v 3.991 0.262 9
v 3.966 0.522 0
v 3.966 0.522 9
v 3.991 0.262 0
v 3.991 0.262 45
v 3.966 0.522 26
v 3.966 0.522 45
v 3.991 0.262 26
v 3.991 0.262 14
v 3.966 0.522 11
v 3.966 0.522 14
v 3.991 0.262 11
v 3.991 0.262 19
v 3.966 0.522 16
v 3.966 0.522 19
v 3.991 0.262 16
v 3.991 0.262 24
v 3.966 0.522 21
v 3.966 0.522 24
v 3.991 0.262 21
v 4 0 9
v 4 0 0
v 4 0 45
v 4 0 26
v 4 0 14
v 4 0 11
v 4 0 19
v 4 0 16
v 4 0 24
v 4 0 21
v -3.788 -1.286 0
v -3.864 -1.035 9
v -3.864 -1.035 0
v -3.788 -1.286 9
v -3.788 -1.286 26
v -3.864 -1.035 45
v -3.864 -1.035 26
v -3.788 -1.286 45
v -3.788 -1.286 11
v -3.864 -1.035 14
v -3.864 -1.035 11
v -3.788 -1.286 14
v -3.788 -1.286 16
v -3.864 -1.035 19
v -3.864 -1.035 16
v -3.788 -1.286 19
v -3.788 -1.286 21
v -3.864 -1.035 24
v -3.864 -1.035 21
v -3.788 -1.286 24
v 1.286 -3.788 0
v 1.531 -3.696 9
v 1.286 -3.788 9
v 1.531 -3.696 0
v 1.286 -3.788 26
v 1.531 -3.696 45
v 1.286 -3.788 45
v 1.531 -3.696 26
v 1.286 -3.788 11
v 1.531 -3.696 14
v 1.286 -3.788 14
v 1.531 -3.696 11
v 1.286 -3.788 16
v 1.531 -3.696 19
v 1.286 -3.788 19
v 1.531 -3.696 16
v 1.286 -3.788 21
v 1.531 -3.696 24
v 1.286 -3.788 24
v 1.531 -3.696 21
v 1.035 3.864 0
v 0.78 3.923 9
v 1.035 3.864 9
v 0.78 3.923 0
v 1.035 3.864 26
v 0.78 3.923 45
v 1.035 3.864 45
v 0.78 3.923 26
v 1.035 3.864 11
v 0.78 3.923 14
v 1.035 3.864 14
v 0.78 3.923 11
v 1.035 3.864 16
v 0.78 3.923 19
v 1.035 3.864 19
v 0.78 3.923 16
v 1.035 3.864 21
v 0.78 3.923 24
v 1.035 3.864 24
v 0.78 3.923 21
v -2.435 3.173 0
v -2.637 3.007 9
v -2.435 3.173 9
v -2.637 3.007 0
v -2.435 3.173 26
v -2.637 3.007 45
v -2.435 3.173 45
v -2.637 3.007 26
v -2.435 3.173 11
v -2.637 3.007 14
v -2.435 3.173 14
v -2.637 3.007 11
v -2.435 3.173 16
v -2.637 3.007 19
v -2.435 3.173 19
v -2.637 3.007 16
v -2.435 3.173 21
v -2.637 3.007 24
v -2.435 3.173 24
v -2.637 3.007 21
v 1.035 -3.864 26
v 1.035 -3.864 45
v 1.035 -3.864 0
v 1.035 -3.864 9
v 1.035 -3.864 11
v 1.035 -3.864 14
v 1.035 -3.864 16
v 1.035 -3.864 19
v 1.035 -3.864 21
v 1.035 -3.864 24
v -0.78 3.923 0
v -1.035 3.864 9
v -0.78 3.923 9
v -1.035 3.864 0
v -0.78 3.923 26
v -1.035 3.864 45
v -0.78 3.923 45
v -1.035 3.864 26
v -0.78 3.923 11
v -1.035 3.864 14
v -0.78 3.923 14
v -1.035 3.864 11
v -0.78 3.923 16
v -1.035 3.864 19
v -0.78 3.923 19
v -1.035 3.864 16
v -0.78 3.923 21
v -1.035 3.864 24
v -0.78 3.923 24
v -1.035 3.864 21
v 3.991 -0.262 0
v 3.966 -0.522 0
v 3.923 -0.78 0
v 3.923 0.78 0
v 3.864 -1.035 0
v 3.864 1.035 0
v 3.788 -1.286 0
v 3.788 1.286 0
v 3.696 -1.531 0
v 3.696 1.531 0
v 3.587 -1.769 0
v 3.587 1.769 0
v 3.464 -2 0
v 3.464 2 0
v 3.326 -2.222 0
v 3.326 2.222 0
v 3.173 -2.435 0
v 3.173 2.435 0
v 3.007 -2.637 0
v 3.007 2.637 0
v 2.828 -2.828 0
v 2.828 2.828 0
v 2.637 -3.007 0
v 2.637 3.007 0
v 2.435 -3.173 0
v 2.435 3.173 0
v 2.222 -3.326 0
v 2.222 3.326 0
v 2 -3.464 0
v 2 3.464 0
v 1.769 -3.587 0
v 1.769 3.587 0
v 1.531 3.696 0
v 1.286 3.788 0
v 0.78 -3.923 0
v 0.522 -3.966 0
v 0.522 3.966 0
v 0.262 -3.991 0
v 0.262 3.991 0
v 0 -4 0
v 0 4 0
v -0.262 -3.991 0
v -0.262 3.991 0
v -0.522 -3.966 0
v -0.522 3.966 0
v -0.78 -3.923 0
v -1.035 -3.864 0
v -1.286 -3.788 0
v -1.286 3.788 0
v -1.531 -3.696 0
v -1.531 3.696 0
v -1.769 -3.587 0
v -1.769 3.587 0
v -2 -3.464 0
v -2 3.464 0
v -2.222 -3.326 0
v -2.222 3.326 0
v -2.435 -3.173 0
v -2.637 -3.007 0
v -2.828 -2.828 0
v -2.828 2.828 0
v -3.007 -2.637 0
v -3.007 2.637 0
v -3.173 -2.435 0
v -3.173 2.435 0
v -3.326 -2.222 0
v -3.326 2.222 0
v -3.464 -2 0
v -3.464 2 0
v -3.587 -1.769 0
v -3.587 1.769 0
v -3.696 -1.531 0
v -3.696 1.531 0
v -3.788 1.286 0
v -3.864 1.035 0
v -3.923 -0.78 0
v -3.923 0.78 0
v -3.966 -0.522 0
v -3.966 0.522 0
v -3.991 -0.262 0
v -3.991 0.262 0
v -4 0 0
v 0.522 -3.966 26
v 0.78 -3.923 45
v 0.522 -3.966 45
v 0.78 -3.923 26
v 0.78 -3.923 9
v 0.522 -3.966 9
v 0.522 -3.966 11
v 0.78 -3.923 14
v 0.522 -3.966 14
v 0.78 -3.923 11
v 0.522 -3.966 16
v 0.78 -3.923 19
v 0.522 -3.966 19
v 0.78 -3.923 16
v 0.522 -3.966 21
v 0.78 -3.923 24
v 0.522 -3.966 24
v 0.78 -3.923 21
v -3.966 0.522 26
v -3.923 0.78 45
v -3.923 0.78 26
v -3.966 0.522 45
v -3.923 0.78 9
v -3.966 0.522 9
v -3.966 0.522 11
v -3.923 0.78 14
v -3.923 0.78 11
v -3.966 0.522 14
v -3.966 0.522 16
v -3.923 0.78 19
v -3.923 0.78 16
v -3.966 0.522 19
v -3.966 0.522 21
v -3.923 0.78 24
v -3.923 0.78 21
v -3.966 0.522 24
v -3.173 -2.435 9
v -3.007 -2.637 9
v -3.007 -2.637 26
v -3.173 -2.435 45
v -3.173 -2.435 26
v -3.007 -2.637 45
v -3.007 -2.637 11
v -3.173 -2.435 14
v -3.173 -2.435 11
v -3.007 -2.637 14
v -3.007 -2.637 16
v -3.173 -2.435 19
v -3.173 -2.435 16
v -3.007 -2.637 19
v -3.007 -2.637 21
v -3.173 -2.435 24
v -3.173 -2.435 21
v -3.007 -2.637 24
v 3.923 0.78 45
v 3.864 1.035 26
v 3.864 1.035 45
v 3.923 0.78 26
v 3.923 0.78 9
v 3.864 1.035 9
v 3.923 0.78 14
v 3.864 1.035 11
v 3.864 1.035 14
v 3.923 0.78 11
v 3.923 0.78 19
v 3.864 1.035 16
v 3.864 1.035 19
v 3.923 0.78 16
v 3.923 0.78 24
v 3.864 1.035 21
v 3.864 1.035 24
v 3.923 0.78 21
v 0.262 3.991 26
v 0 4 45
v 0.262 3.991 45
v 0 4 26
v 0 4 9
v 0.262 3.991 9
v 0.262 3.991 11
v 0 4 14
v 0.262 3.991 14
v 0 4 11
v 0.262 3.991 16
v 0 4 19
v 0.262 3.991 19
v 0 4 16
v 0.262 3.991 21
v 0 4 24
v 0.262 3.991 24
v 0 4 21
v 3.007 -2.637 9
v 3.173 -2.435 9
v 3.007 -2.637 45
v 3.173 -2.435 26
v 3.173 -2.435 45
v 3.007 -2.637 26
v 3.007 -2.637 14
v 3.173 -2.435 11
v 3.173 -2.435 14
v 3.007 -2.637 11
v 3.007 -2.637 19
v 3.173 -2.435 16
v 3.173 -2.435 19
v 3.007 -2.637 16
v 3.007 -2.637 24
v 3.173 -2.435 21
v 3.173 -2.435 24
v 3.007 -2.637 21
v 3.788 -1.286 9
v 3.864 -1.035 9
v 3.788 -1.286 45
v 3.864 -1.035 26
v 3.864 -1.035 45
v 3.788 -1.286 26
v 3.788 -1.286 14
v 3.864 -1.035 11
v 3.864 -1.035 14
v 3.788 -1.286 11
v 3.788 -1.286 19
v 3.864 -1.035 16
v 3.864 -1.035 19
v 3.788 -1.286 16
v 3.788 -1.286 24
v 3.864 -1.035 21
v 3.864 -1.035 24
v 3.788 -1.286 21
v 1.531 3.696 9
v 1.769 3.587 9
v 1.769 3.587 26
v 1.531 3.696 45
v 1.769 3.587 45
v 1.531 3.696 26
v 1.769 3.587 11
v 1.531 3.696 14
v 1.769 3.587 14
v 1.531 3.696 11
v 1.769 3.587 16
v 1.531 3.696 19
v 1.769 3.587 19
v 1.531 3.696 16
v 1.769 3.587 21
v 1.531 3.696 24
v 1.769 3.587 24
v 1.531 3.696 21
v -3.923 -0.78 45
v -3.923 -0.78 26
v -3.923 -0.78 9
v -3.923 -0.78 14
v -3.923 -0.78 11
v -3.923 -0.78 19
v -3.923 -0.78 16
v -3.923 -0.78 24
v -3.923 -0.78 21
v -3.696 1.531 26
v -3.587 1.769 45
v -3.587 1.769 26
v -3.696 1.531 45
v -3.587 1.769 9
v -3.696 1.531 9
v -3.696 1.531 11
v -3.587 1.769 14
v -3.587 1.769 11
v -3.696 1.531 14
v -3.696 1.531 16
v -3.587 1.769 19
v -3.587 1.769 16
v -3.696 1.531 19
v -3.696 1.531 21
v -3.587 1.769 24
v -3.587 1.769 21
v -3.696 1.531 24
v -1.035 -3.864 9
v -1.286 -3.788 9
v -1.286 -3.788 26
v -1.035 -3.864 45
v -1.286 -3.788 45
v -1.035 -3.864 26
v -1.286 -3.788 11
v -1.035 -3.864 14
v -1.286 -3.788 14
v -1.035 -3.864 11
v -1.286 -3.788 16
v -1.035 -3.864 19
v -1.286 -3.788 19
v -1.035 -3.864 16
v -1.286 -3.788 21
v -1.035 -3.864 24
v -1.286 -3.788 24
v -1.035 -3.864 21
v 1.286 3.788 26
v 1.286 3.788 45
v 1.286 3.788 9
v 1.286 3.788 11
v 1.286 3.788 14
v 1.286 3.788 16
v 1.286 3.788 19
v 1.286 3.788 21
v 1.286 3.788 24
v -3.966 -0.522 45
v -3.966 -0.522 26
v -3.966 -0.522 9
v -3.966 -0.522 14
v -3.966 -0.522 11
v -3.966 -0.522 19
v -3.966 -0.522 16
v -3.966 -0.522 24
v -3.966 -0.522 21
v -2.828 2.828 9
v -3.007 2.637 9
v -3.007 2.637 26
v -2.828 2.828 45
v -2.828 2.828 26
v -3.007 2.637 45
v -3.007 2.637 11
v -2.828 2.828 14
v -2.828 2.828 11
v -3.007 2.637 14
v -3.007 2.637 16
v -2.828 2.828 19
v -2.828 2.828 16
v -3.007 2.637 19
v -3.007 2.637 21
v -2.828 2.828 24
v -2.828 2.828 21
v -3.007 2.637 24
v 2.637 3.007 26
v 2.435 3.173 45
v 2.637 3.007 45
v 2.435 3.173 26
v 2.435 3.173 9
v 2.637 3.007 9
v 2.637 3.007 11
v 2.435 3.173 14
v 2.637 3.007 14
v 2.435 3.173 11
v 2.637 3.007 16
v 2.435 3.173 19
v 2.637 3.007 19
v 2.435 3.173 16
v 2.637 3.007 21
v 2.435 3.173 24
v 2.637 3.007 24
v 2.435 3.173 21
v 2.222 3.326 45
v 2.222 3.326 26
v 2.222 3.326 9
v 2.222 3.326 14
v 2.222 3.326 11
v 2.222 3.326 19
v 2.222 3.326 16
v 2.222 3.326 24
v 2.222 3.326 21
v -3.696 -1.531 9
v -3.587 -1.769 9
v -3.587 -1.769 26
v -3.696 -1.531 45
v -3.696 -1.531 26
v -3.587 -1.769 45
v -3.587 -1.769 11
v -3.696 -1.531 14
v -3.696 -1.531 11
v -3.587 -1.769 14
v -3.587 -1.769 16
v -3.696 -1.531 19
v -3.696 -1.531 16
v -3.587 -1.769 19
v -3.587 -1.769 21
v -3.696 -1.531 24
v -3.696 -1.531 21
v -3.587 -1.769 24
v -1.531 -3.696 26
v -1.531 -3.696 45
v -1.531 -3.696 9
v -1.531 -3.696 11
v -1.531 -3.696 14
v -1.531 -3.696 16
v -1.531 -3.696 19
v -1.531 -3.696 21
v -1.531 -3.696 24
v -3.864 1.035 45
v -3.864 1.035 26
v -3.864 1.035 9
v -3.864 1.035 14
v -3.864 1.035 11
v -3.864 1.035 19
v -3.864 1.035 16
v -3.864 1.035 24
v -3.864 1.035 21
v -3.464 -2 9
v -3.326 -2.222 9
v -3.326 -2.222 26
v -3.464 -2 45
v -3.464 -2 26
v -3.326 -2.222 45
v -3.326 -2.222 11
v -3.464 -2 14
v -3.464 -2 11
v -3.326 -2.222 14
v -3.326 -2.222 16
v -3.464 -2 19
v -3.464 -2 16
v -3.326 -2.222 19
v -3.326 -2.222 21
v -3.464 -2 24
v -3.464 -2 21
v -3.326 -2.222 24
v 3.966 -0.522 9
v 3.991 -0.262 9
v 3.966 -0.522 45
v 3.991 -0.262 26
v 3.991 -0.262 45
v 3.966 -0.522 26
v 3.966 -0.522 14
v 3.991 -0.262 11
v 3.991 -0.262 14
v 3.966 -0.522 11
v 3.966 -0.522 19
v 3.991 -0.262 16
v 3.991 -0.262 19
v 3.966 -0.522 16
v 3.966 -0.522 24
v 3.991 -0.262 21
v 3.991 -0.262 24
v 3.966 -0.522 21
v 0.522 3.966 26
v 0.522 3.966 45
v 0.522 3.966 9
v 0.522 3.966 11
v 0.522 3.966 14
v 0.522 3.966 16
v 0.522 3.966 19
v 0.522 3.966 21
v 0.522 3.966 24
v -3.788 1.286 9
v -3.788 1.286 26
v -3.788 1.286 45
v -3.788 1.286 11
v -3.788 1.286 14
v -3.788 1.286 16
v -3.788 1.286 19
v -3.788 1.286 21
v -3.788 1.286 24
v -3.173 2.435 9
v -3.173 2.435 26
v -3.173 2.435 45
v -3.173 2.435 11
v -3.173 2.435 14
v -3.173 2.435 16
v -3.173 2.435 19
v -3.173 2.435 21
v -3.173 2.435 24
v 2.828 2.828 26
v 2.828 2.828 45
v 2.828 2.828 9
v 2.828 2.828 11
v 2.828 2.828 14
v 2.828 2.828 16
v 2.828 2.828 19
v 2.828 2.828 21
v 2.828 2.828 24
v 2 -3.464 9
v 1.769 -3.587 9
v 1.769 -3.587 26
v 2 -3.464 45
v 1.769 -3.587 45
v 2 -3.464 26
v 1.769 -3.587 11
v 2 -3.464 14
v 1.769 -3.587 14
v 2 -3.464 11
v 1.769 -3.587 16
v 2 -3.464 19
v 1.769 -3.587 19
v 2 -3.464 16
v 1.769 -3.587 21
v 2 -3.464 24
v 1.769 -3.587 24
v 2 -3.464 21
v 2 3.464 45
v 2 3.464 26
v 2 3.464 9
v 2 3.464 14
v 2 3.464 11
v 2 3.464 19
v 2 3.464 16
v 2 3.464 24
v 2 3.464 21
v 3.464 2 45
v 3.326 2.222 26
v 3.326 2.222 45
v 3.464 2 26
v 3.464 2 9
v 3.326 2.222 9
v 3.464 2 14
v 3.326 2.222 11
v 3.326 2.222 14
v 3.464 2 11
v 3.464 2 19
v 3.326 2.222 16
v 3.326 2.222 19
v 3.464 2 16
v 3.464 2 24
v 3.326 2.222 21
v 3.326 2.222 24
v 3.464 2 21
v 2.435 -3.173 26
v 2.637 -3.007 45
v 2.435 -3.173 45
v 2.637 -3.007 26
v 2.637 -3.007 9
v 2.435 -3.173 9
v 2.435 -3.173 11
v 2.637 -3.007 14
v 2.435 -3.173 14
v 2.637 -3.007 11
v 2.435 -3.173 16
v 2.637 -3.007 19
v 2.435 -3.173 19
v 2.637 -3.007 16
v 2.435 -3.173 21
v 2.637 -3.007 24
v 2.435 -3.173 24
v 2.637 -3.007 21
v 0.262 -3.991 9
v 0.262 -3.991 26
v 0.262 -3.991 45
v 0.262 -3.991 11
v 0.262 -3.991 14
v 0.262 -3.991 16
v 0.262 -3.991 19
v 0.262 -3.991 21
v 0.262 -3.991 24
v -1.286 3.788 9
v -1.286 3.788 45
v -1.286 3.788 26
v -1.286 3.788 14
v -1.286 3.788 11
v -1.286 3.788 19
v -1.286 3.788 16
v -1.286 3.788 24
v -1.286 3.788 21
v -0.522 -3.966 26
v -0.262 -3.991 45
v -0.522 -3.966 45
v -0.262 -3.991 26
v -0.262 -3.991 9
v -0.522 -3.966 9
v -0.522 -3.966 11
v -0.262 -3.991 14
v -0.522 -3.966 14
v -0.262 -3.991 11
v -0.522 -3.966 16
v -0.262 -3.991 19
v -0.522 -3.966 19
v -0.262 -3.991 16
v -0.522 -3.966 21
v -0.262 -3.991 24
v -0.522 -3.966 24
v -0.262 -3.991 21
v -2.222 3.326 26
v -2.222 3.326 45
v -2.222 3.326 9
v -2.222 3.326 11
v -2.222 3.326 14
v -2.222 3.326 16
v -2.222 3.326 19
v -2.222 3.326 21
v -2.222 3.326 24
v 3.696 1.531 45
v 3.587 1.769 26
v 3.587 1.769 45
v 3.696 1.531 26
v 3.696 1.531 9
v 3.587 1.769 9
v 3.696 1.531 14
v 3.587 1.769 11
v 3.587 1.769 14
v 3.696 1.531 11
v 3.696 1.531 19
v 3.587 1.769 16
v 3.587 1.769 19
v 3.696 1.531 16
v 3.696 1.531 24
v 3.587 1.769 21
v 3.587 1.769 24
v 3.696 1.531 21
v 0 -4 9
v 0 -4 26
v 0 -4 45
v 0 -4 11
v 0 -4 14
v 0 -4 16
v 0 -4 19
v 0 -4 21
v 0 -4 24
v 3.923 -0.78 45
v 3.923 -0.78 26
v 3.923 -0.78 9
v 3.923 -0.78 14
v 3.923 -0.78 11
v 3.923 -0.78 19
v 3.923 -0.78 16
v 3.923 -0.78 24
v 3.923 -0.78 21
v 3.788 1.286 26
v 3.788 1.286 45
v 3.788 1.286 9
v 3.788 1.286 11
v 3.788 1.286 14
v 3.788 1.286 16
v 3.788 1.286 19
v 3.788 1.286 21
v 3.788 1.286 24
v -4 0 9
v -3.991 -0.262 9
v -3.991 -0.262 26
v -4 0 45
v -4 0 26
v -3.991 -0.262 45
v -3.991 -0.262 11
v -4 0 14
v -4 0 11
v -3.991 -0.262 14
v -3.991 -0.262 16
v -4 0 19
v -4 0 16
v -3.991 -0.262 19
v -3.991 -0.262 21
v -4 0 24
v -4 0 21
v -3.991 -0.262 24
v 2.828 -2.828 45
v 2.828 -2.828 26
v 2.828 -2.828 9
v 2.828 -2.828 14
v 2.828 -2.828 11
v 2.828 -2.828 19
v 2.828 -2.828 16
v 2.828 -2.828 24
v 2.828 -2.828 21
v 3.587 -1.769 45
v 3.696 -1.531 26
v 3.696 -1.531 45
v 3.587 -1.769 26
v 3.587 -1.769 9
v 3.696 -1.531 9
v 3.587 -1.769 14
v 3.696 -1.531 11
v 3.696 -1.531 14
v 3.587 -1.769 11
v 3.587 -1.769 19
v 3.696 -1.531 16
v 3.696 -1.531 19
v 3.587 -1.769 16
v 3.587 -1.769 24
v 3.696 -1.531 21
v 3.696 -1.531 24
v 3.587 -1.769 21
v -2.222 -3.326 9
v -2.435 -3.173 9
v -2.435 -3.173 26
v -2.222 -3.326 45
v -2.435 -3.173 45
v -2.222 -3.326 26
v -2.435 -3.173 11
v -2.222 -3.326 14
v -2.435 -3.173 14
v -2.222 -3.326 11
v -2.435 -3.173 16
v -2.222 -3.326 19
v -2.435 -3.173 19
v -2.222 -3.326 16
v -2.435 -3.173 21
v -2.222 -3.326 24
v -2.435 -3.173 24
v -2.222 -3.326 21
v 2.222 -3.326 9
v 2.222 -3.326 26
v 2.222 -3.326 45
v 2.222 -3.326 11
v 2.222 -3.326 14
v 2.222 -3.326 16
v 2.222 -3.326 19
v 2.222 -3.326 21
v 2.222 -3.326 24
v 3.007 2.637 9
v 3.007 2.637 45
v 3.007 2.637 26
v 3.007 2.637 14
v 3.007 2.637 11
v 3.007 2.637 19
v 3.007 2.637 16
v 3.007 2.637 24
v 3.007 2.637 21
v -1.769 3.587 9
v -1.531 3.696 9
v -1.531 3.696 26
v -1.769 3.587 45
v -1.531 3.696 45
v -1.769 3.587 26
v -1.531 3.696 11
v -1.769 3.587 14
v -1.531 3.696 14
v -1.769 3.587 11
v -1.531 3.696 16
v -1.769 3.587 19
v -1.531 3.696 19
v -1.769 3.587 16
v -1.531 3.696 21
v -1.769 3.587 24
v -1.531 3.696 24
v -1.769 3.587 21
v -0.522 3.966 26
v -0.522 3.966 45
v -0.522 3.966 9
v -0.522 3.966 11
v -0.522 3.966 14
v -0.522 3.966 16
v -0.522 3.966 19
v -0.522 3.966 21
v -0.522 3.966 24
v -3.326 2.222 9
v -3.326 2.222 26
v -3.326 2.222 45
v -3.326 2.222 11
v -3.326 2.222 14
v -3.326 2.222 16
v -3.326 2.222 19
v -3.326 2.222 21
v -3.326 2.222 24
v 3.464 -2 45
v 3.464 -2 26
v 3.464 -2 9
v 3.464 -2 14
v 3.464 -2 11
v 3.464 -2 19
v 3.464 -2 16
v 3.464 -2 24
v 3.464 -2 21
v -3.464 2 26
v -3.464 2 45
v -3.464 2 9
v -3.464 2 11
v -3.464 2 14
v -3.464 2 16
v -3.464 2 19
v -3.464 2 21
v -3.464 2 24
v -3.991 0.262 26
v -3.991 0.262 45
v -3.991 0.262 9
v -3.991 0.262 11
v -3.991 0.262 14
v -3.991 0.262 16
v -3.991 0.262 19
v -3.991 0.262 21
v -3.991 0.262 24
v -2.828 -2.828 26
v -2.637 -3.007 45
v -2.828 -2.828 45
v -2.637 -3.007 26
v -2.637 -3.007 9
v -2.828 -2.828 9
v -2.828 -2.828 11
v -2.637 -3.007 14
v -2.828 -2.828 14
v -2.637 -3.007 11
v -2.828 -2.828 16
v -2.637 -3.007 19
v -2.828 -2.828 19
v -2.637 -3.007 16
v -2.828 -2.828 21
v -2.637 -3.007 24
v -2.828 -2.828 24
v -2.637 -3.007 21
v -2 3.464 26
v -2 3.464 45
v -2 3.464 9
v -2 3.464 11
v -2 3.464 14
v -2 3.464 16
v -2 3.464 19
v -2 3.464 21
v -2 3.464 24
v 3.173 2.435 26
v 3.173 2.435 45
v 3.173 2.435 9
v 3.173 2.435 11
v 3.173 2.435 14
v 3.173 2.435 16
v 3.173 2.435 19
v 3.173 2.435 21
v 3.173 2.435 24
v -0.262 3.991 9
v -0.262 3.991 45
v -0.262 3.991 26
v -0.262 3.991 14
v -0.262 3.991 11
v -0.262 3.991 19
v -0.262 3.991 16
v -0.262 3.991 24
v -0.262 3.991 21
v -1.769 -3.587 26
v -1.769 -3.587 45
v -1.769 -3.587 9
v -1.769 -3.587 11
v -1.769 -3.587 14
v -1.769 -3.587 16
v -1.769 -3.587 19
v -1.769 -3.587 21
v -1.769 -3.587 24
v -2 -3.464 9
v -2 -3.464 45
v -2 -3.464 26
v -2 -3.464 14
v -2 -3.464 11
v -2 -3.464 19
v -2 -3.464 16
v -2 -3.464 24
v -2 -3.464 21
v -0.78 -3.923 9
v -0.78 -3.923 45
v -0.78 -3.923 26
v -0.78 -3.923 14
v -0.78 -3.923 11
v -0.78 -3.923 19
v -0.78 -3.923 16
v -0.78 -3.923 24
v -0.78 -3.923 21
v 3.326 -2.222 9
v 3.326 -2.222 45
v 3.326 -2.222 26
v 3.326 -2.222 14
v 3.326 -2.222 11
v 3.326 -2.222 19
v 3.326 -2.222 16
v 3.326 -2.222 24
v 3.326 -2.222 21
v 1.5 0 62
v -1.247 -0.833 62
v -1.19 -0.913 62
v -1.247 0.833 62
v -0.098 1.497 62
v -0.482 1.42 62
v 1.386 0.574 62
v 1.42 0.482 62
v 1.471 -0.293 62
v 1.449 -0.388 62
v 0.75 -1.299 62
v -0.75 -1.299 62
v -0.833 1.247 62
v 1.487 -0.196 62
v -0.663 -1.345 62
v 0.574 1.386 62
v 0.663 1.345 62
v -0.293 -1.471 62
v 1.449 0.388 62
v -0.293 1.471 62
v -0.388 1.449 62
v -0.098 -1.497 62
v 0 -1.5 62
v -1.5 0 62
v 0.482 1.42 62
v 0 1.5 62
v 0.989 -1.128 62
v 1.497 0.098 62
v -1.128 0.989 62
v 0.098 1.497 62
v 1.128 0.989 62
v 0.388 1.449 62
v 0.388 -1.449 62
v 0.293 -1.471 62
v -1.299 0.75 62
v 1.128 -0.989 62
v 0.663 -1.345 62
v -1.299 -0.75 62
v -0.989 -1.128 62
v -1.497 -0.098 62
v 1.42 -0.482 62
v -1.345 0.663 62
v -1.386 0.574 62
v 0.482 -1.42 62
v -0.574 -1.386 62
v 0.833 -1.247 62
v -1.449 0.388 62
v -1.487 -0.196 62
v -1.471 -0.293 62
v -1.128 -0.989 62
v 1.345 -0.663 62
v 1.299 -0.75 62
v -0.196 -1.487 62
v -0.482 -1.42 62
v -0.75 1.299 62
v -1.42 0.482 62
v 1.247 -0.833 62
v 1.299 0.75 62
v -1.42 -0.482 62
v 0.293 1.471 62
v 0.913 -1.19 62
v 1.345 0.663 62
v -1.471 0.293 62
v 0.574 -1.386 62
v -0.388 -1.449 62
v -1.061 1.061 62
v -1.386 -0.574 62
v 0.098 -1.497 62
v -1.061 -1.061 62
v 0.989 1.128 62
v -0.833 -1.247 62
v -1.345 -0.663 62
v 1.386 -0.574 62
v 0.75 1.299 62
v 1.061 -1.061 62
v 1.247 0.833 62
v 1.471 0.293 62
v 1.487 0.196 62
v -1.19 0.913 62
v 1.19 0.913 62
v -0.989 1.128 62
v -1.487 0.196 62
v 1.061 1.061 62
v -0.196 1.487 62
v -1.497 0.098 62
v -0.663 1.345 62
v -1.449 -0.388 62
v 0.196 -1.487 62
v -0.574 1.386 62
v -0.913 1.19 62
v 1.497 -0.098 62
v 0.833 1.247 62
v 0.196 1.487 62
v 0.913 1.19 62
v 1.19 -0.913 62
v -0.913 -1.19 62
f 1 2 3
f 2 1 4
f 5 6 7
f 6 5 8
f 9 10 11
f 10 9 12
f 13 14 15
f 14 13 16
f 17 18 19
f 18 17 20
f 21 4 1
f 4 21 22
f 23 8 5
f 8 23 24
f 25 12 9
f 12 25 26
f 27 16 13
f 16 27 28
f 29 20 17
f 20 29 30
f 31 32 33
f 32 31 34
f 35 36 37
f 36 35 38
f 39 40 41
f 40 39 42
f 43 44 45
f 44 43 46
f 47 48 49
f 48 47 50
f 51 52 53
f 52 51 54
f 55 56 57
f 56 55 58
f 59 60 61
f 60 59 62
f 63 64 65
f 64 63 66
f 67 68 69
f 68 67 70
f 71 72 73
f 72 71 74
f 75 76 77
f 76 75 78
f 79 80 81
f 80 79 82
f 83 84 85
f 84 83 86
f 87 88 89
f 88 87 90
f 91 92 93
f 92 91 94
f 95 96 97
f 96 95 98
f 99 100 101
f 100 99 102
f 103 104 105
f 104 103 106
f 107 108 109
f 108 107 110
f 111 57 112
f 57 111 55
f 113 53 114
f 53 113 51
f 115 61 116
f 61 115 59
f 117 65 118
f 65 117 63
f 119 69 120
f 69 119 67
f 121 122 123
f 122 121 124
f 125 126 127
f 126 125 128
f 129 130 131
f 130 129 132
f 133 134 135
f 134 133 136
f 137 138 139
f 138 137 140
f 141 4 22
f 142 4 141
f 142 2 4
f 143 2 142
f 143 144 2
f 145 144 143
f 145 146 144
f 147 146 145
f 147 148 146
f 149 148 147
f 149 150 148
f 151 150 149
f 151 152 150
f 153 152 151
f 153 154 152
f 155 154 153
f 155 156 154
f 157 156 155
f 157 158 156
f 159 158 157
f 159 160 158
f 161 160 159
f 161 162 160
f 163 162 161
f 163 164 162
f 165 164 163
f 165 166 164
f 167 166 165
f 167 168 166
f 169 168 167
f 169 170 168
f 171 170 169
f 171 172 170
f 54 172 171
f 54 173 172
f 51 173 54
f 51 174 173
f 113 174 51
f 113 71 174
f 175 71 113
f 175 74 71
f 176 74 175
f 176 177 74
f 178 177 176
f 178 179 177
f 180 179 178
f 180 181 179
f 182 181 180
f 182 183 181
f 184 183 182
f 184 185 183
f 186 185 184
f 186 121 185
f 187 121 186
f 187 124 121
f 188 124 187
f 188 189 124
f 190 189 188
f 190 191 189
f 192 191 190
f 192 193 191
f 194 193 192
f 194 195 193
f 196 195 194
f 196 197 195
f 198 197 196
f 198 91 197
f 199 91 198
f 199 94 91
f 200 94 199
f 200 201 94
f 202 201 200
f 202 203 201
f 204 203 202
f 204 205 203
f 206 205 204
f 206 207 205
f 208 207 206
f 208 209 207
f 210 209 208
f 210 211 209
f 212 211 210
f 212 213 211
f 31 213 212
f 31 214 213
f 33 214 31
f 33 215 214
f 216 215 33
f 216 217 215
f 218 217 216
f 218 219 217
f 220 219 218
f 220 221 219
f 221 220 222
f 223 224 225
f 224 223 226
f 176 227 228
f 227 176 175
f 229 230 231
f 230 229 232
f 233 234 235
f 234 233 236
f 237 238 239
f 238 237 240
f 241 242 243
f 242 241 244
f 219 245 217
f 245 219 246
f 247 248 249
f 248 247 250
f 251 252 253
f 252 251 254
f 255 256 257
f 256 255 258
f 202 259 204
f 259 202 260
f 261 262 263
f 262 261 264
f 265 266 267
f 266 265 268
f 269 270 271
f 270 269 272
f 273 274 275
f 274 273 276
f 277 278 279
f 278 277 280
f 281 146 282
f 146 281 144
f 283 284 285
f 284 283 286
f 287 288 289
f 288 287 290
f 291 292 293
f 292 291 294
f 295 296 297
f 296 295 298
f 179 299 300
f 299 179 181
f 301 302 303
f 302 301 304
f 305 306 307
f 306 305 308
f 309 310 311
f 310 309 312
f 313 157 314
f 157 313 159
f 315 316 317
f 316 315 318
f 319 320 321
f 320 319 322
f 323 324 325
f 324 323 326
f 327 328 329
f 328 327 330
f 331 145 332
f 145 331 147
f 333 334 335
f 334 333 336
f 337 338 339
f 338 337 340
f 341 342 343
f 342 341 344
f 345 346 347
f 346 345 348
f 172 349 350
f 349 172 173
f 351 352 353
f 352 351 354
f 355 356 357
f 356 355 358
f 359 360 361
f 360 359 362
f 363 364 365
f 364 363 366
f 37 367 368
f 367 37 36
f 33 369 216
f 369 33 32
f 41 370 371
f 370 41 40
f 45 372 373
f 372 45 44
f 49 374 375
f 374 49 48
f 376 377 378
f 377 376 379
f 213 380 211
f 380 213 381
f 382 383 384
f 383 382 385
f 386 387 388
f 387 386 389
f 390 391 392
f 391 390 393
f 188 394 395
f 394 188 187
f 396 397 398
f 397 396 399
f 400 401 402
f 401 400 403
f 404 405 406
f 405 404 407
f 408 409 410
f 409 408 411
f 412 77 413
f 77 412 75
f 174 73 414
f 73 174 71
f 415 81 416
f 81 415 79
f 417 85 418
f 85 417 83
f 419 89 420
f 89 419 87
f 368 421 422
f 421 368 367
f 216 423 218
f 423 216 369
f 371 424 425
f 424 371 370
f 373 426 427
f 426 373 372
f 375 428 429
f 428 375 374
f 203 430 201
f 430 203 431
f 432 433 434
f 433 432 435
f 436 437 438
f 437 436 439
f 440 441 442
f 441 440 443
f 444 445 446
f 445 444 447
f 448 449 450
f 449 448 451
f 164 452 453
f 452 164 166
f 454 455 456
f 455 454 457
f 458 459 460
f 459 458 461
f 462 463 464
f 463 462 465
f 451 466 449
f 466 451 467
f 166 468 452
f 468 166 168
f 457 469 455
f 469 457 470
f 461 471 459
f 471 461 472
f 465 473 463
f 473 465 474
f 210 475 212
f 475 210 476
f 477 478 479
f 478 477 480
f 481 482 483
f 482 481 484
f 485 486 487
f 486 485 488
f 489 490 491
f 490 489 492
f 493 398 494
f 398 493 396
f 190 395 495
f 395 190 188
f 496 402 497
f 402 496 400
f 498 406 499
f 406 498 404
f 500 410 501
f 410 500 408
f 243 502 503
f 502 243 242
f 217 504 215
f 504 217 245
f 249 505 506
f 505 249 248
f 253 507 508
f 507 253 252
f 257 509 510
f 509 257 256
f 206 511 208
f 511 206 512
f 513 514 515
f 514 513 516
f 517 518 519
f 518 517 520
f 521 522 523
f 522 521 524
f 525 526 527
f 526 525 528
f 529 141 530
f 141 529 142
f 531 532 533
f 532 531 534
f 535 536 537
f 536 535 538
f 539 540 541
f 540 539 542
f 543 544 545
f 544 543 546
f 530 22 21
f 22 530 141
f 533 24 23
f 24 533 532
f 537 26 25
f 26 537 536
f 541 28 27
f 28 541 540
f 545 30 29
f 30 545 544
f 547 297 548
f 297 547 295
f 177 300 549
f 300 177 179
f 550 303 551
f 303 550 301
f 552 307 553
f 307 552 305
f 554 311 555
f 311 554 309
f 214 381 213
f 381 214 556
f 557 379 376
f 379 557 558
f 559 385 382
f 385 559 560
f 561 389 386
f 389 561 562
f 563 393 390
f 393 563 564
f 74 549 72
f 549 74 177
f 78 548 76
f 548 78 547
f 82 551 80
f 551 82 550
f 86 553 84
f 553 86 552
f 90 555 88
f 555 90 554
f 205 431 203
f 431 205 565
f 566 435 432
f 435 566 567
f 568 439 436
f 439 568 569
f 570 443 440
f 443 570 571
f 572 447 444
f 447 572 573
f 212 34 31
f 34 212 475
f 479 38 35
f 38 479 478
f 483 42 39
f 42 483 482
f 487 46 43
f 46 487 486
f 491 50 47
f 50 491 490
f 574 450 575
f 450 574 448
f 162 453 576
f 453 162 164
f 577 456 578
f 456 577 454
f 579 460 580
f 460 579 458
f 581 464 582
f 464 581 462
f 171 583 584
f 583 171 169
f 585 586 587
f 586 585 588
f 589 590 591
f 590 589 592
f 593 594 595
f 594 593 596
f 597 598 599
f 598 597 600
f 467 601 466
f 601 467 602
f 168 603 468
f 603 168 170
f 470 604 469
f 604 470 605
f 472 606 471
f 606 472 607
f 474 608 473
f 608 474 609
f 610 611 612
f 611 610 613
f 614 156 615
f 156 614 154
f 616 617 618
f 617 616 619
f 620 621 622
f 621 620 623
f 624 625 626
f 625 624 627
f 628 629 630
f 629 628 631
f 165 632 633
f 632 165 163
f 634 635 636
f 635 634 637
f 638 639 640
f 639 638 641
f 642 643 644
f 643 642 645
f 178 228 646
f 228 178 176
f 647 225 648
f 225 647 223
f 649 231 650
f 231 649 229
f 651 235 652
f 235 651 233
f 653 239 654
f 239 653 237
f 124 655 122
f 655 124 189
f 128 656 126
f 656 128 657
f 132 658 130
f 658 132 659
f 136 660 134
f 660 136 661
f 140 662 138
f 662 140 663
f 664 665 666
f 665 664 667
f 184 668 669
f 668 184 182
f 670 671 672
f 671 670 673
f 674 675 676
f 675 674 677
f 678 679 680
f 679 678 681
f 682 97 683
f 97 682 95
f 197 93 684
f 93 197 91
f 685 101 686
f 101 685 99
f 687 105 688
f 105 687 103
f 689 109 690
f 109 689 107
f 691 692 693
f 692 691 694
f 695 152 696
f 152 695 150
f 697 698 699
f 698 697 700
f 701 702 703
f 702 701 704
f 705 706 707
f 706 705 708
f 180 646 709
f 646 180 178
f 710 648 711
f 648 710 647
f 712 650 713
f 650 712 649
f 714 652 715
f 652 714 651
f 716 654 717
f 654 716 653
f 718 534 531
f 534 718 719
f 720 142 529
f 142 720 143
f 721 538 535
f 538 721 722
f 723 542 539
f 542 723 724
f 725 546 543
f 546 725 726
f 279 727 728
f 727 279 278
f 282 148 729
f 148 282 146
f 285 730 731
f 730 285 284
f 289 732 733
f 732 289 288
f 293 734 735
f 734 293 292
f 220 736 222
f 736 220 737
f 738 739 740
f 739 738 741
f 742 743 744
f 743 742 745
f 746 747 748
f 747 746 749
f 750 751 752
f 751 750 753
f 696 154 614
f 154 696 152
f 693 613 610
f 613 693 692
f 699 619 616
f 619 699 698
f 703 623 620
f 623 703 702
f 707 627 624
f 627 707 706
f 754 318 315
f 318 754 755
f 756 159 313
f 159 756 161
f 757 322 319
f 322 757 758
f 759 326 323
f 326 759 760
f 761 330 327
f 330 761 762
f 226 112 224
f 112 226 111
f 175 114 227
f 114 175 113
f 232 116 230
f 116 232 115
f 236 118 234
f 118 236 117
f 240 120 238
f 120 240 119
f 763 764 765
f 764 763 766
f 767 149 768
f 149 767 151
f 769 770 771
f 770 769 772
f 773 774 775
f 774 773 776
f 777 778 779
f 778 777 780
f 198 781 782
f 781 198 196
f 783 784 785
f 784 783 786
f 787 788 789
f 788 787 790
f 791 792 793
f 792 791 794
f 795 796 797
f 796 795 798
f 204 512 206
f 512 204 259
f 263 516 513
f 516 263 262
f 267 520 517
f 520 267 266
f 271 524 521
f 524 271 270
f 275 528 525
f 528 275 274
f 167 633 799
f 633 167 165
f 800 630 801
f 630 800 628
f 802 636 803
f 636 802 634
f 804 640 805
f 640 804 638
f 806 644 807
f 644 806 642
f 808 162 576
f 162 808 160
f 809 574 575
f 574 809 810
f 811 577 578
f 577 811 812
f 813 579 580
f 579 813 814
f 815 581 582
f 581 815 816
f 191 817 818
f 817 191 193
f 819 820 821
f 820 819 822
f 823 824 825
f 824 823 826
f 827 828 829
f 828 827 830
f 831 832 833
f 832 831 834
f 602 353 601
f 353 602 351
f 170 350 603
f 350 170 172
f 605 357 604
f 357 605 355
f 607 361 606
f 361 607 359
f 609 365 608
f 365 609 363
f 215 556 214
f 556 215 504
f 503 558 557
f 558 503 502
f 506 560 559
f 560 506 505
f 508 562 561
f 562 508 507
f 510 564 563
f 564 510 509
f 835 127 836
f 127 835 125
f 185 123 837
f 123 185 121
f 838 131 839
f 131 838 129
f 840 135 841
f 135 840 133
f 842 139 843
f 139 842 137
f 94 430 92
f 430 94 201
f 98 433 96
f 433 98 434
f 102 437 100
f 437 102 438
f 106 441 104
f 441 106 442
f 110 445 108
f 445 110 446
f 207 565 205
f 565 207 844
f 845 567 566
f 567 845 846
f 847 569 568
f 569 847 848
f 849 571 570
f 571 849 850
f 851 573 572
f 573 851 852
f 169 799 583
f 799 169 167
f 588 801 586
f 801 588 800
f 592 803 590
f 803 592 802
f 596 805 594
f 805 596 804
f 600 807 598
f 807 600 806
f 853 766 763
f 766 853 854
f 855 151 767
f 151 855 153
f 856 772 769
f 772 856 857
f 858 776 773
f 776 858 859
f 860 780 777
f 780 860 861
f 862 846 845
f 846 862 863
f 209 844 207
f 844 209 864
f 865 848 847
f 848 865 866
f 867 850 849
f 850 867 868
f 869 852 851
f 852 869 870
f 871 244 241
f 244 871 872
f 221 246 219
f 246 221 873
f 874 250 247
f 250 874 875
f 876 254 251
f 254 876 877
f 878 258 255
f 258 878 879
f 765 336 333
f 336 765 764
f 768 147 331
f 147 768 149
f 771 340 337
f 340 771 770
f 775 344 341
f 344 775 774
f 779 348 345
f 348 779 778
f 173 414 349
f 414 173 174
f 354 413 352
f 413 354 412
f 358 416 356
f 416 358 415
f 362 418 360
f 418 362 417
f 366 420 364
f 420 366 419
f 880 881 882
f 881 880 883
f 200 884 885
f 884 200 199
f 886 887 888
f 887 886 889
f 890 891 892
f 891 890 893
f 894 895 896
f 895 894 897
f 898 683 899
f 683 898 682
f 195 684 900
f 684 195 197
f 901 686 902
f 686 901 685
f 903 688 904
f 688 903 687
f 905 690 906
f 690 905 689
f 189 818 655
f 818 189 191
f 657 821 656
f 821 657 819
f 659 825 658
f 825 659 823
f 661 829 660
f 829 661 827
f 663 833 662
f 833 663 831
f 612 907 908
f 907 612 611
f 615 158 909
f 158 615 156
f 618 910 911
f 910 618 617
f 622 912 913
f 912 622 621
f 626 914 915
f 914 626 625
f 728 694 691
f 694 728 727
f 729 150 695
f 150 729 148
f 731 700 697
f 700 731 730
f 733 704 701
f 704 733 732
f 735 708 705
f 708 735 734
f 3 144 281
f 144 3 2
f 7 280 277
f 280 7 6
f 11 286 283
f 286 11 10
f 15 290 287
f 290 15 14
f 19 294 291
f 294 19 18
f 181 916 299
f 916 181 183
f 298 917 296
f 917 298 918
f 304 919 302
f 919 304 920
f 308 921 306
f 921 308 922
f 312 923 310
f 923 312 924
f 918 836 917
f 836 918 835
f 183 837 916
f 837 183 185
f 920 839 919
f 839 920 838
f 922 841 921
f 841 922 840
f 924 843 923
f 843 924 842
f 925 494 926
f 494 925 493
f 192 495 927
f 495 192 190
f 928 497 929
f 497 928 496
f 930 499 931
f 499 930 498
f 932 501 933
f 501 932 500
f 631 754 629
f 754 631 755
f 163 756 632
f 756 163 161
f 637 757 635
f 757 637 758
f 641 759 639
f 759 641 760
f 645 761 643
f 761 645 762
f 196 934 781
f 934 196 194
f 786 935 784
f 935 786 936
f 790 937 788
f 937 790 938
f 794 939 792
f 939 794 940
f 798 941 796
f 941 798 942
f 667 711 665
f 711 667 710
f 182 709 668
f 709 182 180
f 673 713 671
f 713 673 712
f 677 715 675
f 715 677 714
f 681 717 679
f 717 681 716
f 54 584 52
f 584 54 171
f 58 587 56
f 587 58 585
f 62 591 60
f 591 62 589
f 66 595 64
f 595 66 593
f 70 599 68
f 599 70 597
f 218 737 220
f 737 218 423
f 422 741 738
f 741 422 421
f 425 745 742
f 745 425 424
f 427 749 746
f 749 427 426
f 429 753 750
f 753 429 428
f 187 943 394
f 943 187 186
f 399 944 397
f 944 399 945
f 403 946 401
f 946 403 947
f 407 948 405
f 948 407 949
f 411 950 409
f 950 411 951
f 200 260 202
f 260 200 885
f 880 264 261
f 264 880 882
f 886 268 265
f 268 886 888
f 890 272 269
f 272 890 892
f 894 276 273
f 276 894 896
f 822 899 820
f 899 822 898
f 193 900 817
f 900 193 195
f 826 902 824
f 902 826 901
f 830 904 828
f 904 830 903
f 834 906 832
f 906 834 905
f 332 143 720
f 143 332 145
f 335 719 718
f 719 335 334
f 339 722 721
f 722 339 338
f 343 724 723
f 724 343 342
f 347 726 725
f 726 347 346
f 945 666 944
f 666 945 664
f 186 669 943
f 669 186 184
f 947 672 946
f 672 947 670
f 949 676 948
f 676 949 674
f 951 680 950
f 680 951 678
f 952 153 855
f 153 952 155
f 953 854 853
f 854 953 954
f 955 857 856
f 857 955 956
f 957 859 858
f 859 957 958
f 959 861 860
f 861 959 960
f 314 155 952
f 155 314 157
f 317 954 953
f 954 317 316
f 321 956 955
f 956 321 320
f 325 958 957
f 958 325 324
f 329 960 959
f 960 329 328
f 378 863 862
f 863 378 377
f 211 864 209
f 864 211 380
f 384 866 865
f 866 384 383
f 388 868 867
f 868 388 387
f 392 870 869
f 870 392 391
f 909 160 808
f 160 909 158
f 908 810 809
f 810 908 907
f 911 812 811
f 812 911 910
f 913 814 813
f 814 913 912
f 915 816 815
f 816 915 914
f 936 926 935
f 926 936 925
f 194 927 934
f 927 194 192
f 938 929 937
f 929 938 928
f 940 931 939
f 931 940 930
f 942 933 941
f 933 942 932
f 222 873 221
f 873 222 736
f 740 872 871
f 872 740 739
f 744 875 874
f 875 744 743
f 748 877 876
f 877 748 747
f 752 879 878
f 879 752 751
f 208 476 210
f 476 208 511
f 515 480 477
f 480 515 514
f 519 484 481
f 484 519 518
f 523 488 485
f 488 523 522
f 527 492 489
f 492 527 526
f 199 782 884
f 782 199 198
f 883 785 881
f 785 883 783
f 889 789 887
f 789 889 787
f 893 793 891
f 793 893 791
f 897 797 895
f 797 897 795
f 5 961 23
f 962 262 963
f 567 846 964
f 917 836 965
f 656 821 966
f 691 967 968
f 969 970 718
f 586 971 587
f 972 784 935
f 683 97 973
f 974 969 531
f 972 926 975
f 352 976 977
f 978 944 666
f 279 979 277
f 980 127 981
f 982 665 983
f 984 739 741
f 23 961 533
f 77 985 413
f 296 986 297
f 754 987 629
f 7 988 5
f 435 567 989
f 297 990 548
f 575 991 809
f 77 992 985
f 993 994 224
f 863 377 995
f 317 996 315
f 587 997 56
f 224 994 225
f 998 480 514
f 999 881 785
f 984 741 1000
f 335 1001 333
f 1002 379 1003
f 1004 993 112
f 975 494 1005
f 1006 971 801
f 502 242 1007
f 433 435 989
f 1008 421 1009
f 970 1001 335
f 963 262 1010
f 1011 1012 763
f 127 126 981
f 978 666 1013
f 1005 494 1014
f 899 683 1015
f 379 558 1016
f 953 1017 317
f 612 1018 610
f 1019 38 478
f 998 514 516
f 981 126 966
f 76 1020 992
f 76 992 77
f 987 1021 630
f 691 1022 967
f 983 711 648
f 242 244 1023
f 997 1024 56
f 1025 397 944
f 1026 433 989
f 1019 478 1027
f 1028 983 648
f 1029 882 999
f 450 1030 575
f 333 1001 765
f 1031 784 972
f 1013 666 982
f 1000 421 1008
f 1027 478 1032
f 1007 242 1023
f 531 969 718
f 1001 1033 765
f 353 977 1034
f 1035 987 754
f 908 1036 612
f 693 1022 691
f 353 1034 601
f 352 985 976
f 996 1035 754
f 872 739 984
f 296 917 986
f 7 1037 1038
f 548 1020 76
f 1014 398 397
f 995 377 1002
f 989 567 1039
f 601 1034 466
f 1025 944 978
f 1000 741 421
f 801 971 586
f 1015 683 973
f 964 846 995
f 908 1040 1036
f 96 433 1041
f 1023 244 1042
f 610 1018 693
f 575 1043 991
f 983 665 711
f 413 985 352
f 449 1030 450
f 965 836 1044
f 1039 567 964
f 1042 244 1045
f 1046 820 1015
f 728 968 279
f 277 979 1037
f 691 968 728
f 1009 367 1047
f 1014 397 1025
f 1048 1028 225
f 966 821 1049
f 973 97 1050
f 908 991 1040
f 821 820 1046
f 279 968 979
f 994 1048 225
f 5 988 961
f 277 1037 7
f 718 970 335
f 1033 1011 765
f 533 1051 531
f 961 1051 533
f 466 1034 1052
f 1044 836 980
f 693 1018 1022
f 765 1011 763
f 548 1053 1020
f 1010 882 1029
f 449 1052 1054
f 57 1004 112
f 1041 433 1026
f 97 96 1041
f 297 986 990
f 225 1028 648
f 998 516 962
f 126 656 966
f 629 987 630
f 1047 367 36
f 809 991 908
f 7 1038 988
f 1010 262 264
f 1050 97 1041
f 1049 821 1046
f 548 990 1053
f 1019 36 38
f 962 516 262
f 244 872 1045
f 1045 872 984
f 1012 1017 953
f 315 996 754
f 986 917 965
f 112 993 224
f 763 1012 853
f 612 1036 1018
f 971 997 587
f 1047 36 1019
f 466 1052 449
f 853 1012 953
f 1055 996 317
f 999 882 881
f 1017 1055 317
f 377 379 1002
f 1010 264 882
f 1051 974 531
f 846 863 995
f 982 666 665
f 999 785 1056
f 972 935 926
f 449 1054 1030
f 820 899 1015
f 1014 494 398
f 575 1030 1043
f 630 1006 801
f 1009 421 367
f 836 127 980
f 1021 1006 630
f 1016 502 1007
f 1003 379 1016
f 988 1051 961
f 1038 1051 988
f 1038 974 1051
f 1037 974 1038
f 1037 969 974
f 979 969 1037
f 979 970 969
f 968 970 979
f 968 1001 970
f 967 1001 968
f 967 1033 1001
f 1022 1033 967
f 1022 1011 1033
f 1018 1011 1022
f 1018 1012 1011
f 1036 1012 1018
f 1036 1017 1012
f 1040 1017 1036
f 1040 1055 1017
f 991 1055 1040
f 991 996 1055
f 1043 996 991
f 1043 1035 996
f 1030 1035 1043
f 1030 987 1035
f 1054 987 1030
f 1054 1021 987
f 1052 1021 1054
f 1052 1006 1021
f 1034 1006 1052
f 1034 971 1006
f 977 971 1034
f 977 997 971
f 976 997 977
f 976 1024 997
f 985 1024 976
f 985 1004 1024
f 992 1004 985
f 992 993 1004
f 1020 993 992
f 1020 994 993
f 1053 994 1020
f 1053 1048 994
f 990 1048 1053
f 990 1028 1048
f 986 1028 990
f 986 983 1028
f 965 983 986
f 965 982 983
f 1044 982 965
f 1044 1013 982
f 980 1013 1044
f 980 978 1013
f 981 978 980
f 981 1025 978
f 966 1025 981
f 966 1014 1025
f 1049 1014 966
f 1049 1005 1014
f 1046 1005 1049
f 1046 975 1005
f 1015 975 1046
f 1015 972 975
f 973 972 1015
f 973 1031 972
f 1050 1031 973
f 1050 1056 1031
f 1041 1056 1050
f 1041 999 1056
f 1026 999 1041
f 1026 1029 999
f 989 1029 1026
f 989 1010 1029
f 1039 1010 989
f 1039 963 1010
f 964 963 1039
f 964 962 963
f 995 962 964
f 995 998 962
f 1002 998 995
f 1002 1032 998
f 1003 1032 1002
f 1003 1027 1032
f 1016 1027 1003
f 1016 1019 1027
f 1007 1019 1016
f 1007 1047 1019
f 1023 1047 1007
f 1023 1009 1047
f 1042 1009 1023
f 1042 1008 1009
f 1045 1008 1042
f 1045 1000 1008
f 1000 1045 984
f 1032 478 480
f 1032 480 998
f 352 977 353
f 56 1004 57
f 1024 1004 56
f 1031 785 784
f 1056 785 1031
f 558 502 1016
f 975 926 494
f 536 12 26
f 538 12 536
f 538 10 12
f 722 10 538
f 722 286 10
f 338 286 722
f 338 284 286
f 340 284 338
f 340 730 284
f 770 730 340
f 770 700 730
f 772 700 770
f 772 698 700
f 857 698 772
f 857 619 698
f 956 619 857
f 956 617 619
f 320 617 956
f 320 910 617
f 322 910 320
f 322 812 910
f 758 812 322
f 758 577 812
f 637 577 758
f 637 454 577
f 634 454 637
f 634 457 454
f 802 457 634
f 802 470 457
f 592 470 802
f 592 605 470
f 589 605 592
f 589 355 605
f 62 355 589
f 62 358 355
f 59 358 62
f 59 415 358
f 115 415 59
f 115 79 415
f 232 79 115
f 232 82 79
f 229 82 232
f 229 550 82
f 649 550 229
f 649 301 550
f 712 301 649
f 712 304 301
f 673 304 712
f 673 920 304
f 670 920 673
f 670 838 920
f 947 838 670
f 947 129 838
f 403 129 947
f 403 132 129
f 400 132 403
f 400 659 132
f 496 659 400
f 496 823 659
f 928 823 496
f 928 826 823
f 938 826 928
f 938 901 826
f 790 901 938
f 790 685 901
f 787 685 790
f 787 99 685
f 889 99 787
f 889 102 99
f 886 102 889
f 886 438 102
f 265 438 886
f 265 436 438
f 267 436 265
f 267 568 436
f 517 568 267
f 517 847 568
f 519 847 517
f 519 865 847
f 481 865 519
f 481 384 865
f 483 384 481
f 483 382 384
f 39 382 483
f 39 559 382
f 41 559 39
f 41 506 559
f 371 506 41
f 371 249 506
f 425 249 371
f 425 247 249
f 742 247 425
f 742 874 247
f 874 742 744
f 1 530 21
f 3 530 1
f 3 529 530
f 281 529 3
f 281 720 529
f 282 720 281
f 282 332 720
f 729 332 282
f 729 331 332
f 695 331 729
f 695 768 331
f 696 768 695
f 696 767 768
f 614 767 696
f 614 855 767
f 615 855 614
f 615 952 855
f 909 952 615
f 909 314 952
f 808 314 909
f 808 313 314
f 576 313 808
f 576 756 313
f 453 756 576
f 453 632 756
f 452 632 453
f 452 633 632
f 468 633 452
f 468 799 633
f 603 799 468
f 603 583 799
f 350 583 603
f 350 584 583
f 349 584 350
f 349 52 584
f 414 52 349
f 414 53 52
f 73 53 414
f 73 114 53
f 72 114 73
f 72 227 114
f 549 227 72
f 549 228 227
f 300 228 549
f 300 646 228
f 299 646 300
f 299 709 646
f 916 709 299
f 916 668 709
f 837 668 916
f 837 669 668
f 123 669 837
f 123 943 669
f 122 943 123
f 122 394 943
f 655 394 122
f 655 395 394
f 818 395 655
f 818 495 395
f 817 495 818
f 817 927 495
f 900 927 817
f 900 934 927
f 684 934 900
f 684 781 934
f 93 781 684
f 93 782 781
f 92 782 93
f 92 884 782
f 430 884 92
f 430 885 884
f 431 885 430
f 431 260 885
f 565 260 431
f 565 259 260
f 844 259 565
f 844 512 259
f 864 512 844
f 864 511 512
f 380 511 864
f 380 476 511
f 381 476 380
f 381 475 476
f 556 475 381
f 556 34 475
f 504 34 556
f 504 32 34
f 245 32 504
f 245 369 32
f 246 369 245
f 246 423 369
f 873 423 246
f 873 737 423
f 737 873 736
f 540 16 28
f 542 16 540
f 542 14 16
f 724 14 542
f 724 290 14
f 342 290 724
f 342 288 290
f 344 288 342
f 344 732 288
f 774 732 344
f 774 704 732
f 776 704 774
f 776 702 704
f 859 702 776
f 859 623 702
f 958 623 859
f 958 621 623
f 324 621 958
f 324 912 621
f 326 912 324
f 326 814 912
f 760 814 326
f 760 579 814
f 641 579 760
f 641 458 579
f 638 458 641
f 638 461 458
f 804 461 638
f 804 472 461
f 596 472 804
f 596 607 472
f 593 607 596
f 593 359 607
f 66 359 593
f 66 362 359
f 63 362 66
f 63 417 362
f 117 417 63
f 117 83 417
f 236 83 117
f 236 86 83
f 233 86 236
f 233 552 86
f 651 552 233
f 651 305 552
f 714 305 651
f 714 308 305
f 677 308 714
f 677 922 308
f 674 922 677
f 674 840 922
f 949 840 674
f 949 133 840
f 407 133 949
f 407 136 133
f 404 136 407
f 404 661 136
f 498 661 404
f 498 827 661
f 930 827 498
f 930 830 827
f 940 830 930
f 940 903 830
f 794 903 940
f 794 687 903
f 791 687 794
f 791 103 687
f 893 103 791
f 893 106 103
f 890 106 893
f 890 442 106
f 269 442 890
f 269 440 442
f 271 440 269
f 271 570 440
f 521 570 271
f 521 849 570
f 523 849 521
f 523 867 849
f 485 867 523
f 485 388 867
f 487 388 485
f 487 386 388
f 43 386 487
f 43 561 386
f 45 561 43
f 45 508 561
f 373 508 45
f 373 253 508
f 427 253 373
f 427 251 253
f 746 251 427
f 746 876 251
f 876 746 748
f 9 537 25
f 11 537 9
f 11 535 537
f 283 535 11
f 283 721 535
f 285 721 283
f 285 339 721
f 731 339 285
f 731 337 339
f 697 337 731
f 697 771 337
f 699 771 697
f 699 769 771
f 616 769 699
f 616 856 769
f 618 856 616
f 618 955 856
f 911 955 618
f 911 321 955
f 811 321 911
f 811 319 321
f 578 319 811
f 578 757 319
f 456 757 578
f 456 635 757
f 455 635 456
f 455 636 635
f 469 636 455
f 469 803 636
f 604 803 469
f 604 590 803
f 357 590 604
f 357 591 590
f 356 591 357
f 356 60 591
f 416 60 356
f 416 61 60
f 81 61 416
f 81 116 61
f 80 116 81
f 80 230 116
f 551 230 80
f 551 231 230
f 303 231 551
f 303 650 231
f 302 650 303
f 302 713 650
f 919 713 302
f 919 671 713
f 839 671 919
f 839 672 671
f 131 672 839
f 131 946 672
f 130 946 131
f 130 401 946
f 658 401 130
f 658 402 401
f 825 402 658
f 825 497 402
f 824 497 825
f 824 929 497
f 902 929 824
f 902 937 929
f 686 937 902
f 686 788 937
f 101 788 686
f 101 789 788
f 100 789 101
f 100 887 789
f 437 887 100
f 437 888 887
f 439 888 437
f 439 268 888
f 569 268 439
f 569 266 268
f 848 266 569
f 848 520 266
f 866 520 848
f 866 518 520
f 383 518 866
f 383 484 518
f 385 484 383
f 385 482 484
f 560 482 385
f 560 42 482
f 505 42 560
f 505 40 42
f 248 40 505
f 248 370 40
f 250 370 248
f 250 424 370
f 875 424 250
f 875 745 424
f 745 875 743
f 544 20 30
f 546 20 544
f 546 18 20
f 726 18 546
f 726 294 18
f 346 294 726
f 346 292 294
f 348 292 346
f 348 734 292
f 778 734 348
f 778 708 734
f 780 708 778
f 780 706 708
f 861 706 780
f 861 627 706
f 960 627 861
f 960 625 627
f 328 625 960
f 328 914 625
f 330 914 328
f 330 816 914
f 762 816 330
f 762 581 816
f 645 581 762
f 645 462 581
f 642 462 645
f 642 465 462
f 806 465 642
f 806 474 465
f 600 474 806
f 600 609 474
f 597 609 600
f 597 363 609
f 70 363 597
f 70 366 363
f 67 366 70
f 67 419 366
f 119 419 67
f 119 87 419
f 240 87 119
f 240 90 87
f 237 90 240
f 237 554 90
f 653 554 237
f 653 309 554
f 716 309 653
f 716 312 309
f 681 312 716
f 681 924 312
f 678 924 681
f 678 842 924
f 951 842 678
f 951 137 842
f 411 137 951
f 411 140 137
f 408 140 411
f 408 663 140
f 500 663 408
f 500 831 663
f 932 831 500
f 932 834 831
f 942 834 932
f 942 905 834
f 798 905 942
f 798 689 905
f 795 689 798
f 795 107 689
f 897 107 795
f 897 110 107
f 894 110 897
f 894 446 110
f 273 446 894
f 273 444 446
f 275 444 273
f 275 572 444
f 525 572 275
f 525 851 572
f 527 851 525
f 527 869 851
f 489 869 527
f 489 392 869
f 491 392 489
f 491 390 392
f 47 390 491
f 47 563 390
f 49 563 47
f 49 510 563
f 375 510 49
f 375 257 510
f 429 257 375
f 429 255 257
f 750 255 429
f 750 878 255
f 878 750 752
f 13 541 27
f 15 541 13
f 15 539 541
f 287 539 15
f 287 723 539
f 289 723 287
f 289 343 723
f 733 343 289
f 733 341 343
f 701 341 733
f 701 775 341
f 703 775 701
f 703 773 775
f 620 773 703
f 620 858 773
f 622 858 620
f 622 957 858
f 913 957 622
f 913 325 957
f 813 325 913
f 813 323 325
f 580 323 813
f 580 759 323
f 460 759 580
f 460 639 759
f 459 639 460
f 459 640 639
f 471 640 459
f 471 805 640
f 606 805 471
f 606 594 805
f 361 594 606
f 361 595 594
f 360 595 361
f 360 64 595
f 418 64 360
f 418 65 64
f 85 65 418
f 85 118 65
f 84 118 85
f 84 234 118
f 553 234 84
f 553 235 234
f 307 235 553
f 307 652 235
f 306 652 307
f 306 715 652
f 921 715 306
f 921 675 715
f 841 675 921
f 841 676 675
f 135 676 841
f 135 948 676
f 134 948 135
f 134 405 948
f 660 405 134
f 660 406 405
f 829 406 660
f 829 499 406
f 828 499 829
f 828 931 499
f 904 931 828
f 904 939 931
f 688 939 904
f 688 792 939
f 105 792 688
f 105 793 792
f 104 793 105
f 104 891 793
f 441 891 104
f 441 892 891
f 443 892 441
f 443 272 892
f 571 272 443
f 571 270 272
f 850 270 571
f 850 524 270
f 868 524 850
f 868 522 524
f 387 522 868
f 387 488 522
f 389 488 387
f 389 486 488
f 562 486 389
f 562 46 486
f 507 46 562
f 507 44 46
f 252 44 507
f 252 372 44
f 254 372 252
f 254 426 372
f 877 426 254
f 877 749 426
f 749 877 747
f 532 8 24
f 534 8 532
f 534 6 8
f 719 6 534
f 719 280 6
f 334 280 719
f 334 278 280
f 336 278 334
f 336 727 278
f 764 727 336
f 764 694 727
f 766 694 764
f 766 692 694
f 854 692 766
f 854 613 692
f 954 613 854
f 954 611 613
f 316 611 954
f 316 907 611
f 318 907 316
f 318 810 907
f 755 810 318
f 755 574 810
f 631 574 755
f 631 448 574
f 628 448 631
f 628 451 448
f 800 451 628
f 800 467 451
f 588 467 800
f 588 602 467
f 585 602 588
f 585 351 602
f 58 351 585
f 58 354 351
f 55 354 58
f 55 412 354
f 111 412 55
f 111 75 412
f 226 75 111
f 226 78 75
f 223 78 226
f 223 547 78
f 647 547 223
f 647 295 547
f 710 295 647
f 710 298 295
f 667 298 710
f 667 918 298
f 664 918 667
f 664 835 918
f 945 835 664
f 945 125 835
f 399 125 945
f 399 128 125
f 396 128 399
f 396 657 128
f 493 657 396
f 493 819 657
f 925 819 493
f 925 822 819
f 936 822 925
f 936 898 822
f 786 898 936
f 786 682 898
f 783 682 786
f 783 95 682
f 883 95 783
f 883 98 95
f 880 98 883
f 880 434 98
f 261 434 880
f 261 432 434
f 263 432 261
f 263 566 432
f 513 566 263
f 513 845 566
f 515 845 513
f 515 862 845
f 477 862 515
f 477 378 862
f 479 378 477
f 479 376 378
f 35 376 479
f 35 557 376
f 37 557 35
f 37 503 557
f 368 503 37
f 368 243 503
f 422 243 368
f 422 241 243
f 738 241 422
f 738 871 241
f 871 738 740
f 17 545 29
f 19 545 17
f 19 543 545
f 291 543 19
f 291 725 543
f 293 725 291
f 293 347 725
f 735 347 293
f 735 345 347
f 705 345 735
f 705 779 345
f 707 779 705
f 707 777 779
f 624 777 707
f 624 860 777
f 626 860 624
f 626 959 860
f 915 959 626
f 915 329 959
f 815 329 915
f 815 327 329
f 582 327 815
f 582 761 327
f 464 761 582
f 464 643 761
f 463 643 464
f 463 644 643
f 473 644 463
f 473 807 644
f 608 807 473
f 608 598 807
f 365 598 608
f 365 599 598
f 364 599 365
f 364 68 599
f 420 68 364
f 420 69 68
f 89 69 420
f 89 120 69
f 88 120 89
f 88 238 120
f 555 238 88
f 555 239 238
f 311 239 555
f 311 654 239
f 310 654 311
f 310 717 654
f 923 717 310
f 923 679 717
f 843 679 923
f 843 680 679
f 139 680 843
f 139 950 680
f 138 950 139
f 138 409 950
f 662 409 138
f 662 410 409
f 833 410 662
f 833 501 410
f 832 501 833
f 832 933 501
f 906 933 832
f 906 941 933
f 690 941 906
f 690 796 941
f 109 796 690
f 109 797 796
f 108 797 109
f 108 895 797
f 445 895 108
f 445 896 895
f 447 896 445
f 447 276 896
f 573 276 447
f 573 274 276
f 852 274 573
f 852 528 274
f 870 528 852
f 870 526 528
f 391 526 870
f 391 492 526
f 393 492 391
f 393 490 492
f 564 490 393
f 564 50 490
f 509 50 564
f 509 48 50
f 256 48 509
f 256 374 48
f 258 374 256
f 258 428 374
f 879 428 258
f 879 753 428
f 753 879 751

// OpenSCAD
// Pestle for grinding tissue inside a 1.5 mL microcentrifuge tube
// Printed standing upright (z = 0 at the bottom)

// ---------------- Parameters ----------------
handle_d      = 8;    // handle diameter (mm), z = 0 to 45
handle_h      = 45;   // handle height (mm)
cone_d_top    = 8;    // cone diameter at top (mm), z = 45
cone_d_bottom = 3;    // cone diameter at tip (mm), z = 62
cone_h        = 17;   // cone height (mm), z = 45 to 62
tip_r         = 3;    // tip sphere radius (mm), centred at z = 62
groove_count  = 4;    // number of circumferential grooves
groove_w      = 2;    // groove width (mm), in Z
groove_depth  = 1;    // groove depth (mm)
groove_z      = [10, 15, 20, 25]; // groove centre heights (mm)
eps           = 0.5;  // cutter overshoot past faces (mm)

$fn = 96;

// ---------------- Model ----------------
difference() {
    union() {
        // (1) Cylindrical handle
        cylinder(d = handle_d, h = handle_h);

        // (2) Tapered cone: 8 mm at z = 45 to 3 mm at z = 62
        translate([0, 0, handle_h])
            cylinder(d1 = cone_d_top, d2 = cone_d_bottom, h = cone_h);

        // (3) Rounded tip: 3 mm diameter sphere centred at z = 62
        translate([0, 0, cone_h])
            sphere(r = tip_r);
    }

    // Grip grooves, cut through the handle (z = 0 to 45)
    for (z = groove_z)
        translate([0, 0, z - groove_w / 2])
            cylinder(d = handle_d + 2 * eps, h = groove_w, $fn = 96);
}
